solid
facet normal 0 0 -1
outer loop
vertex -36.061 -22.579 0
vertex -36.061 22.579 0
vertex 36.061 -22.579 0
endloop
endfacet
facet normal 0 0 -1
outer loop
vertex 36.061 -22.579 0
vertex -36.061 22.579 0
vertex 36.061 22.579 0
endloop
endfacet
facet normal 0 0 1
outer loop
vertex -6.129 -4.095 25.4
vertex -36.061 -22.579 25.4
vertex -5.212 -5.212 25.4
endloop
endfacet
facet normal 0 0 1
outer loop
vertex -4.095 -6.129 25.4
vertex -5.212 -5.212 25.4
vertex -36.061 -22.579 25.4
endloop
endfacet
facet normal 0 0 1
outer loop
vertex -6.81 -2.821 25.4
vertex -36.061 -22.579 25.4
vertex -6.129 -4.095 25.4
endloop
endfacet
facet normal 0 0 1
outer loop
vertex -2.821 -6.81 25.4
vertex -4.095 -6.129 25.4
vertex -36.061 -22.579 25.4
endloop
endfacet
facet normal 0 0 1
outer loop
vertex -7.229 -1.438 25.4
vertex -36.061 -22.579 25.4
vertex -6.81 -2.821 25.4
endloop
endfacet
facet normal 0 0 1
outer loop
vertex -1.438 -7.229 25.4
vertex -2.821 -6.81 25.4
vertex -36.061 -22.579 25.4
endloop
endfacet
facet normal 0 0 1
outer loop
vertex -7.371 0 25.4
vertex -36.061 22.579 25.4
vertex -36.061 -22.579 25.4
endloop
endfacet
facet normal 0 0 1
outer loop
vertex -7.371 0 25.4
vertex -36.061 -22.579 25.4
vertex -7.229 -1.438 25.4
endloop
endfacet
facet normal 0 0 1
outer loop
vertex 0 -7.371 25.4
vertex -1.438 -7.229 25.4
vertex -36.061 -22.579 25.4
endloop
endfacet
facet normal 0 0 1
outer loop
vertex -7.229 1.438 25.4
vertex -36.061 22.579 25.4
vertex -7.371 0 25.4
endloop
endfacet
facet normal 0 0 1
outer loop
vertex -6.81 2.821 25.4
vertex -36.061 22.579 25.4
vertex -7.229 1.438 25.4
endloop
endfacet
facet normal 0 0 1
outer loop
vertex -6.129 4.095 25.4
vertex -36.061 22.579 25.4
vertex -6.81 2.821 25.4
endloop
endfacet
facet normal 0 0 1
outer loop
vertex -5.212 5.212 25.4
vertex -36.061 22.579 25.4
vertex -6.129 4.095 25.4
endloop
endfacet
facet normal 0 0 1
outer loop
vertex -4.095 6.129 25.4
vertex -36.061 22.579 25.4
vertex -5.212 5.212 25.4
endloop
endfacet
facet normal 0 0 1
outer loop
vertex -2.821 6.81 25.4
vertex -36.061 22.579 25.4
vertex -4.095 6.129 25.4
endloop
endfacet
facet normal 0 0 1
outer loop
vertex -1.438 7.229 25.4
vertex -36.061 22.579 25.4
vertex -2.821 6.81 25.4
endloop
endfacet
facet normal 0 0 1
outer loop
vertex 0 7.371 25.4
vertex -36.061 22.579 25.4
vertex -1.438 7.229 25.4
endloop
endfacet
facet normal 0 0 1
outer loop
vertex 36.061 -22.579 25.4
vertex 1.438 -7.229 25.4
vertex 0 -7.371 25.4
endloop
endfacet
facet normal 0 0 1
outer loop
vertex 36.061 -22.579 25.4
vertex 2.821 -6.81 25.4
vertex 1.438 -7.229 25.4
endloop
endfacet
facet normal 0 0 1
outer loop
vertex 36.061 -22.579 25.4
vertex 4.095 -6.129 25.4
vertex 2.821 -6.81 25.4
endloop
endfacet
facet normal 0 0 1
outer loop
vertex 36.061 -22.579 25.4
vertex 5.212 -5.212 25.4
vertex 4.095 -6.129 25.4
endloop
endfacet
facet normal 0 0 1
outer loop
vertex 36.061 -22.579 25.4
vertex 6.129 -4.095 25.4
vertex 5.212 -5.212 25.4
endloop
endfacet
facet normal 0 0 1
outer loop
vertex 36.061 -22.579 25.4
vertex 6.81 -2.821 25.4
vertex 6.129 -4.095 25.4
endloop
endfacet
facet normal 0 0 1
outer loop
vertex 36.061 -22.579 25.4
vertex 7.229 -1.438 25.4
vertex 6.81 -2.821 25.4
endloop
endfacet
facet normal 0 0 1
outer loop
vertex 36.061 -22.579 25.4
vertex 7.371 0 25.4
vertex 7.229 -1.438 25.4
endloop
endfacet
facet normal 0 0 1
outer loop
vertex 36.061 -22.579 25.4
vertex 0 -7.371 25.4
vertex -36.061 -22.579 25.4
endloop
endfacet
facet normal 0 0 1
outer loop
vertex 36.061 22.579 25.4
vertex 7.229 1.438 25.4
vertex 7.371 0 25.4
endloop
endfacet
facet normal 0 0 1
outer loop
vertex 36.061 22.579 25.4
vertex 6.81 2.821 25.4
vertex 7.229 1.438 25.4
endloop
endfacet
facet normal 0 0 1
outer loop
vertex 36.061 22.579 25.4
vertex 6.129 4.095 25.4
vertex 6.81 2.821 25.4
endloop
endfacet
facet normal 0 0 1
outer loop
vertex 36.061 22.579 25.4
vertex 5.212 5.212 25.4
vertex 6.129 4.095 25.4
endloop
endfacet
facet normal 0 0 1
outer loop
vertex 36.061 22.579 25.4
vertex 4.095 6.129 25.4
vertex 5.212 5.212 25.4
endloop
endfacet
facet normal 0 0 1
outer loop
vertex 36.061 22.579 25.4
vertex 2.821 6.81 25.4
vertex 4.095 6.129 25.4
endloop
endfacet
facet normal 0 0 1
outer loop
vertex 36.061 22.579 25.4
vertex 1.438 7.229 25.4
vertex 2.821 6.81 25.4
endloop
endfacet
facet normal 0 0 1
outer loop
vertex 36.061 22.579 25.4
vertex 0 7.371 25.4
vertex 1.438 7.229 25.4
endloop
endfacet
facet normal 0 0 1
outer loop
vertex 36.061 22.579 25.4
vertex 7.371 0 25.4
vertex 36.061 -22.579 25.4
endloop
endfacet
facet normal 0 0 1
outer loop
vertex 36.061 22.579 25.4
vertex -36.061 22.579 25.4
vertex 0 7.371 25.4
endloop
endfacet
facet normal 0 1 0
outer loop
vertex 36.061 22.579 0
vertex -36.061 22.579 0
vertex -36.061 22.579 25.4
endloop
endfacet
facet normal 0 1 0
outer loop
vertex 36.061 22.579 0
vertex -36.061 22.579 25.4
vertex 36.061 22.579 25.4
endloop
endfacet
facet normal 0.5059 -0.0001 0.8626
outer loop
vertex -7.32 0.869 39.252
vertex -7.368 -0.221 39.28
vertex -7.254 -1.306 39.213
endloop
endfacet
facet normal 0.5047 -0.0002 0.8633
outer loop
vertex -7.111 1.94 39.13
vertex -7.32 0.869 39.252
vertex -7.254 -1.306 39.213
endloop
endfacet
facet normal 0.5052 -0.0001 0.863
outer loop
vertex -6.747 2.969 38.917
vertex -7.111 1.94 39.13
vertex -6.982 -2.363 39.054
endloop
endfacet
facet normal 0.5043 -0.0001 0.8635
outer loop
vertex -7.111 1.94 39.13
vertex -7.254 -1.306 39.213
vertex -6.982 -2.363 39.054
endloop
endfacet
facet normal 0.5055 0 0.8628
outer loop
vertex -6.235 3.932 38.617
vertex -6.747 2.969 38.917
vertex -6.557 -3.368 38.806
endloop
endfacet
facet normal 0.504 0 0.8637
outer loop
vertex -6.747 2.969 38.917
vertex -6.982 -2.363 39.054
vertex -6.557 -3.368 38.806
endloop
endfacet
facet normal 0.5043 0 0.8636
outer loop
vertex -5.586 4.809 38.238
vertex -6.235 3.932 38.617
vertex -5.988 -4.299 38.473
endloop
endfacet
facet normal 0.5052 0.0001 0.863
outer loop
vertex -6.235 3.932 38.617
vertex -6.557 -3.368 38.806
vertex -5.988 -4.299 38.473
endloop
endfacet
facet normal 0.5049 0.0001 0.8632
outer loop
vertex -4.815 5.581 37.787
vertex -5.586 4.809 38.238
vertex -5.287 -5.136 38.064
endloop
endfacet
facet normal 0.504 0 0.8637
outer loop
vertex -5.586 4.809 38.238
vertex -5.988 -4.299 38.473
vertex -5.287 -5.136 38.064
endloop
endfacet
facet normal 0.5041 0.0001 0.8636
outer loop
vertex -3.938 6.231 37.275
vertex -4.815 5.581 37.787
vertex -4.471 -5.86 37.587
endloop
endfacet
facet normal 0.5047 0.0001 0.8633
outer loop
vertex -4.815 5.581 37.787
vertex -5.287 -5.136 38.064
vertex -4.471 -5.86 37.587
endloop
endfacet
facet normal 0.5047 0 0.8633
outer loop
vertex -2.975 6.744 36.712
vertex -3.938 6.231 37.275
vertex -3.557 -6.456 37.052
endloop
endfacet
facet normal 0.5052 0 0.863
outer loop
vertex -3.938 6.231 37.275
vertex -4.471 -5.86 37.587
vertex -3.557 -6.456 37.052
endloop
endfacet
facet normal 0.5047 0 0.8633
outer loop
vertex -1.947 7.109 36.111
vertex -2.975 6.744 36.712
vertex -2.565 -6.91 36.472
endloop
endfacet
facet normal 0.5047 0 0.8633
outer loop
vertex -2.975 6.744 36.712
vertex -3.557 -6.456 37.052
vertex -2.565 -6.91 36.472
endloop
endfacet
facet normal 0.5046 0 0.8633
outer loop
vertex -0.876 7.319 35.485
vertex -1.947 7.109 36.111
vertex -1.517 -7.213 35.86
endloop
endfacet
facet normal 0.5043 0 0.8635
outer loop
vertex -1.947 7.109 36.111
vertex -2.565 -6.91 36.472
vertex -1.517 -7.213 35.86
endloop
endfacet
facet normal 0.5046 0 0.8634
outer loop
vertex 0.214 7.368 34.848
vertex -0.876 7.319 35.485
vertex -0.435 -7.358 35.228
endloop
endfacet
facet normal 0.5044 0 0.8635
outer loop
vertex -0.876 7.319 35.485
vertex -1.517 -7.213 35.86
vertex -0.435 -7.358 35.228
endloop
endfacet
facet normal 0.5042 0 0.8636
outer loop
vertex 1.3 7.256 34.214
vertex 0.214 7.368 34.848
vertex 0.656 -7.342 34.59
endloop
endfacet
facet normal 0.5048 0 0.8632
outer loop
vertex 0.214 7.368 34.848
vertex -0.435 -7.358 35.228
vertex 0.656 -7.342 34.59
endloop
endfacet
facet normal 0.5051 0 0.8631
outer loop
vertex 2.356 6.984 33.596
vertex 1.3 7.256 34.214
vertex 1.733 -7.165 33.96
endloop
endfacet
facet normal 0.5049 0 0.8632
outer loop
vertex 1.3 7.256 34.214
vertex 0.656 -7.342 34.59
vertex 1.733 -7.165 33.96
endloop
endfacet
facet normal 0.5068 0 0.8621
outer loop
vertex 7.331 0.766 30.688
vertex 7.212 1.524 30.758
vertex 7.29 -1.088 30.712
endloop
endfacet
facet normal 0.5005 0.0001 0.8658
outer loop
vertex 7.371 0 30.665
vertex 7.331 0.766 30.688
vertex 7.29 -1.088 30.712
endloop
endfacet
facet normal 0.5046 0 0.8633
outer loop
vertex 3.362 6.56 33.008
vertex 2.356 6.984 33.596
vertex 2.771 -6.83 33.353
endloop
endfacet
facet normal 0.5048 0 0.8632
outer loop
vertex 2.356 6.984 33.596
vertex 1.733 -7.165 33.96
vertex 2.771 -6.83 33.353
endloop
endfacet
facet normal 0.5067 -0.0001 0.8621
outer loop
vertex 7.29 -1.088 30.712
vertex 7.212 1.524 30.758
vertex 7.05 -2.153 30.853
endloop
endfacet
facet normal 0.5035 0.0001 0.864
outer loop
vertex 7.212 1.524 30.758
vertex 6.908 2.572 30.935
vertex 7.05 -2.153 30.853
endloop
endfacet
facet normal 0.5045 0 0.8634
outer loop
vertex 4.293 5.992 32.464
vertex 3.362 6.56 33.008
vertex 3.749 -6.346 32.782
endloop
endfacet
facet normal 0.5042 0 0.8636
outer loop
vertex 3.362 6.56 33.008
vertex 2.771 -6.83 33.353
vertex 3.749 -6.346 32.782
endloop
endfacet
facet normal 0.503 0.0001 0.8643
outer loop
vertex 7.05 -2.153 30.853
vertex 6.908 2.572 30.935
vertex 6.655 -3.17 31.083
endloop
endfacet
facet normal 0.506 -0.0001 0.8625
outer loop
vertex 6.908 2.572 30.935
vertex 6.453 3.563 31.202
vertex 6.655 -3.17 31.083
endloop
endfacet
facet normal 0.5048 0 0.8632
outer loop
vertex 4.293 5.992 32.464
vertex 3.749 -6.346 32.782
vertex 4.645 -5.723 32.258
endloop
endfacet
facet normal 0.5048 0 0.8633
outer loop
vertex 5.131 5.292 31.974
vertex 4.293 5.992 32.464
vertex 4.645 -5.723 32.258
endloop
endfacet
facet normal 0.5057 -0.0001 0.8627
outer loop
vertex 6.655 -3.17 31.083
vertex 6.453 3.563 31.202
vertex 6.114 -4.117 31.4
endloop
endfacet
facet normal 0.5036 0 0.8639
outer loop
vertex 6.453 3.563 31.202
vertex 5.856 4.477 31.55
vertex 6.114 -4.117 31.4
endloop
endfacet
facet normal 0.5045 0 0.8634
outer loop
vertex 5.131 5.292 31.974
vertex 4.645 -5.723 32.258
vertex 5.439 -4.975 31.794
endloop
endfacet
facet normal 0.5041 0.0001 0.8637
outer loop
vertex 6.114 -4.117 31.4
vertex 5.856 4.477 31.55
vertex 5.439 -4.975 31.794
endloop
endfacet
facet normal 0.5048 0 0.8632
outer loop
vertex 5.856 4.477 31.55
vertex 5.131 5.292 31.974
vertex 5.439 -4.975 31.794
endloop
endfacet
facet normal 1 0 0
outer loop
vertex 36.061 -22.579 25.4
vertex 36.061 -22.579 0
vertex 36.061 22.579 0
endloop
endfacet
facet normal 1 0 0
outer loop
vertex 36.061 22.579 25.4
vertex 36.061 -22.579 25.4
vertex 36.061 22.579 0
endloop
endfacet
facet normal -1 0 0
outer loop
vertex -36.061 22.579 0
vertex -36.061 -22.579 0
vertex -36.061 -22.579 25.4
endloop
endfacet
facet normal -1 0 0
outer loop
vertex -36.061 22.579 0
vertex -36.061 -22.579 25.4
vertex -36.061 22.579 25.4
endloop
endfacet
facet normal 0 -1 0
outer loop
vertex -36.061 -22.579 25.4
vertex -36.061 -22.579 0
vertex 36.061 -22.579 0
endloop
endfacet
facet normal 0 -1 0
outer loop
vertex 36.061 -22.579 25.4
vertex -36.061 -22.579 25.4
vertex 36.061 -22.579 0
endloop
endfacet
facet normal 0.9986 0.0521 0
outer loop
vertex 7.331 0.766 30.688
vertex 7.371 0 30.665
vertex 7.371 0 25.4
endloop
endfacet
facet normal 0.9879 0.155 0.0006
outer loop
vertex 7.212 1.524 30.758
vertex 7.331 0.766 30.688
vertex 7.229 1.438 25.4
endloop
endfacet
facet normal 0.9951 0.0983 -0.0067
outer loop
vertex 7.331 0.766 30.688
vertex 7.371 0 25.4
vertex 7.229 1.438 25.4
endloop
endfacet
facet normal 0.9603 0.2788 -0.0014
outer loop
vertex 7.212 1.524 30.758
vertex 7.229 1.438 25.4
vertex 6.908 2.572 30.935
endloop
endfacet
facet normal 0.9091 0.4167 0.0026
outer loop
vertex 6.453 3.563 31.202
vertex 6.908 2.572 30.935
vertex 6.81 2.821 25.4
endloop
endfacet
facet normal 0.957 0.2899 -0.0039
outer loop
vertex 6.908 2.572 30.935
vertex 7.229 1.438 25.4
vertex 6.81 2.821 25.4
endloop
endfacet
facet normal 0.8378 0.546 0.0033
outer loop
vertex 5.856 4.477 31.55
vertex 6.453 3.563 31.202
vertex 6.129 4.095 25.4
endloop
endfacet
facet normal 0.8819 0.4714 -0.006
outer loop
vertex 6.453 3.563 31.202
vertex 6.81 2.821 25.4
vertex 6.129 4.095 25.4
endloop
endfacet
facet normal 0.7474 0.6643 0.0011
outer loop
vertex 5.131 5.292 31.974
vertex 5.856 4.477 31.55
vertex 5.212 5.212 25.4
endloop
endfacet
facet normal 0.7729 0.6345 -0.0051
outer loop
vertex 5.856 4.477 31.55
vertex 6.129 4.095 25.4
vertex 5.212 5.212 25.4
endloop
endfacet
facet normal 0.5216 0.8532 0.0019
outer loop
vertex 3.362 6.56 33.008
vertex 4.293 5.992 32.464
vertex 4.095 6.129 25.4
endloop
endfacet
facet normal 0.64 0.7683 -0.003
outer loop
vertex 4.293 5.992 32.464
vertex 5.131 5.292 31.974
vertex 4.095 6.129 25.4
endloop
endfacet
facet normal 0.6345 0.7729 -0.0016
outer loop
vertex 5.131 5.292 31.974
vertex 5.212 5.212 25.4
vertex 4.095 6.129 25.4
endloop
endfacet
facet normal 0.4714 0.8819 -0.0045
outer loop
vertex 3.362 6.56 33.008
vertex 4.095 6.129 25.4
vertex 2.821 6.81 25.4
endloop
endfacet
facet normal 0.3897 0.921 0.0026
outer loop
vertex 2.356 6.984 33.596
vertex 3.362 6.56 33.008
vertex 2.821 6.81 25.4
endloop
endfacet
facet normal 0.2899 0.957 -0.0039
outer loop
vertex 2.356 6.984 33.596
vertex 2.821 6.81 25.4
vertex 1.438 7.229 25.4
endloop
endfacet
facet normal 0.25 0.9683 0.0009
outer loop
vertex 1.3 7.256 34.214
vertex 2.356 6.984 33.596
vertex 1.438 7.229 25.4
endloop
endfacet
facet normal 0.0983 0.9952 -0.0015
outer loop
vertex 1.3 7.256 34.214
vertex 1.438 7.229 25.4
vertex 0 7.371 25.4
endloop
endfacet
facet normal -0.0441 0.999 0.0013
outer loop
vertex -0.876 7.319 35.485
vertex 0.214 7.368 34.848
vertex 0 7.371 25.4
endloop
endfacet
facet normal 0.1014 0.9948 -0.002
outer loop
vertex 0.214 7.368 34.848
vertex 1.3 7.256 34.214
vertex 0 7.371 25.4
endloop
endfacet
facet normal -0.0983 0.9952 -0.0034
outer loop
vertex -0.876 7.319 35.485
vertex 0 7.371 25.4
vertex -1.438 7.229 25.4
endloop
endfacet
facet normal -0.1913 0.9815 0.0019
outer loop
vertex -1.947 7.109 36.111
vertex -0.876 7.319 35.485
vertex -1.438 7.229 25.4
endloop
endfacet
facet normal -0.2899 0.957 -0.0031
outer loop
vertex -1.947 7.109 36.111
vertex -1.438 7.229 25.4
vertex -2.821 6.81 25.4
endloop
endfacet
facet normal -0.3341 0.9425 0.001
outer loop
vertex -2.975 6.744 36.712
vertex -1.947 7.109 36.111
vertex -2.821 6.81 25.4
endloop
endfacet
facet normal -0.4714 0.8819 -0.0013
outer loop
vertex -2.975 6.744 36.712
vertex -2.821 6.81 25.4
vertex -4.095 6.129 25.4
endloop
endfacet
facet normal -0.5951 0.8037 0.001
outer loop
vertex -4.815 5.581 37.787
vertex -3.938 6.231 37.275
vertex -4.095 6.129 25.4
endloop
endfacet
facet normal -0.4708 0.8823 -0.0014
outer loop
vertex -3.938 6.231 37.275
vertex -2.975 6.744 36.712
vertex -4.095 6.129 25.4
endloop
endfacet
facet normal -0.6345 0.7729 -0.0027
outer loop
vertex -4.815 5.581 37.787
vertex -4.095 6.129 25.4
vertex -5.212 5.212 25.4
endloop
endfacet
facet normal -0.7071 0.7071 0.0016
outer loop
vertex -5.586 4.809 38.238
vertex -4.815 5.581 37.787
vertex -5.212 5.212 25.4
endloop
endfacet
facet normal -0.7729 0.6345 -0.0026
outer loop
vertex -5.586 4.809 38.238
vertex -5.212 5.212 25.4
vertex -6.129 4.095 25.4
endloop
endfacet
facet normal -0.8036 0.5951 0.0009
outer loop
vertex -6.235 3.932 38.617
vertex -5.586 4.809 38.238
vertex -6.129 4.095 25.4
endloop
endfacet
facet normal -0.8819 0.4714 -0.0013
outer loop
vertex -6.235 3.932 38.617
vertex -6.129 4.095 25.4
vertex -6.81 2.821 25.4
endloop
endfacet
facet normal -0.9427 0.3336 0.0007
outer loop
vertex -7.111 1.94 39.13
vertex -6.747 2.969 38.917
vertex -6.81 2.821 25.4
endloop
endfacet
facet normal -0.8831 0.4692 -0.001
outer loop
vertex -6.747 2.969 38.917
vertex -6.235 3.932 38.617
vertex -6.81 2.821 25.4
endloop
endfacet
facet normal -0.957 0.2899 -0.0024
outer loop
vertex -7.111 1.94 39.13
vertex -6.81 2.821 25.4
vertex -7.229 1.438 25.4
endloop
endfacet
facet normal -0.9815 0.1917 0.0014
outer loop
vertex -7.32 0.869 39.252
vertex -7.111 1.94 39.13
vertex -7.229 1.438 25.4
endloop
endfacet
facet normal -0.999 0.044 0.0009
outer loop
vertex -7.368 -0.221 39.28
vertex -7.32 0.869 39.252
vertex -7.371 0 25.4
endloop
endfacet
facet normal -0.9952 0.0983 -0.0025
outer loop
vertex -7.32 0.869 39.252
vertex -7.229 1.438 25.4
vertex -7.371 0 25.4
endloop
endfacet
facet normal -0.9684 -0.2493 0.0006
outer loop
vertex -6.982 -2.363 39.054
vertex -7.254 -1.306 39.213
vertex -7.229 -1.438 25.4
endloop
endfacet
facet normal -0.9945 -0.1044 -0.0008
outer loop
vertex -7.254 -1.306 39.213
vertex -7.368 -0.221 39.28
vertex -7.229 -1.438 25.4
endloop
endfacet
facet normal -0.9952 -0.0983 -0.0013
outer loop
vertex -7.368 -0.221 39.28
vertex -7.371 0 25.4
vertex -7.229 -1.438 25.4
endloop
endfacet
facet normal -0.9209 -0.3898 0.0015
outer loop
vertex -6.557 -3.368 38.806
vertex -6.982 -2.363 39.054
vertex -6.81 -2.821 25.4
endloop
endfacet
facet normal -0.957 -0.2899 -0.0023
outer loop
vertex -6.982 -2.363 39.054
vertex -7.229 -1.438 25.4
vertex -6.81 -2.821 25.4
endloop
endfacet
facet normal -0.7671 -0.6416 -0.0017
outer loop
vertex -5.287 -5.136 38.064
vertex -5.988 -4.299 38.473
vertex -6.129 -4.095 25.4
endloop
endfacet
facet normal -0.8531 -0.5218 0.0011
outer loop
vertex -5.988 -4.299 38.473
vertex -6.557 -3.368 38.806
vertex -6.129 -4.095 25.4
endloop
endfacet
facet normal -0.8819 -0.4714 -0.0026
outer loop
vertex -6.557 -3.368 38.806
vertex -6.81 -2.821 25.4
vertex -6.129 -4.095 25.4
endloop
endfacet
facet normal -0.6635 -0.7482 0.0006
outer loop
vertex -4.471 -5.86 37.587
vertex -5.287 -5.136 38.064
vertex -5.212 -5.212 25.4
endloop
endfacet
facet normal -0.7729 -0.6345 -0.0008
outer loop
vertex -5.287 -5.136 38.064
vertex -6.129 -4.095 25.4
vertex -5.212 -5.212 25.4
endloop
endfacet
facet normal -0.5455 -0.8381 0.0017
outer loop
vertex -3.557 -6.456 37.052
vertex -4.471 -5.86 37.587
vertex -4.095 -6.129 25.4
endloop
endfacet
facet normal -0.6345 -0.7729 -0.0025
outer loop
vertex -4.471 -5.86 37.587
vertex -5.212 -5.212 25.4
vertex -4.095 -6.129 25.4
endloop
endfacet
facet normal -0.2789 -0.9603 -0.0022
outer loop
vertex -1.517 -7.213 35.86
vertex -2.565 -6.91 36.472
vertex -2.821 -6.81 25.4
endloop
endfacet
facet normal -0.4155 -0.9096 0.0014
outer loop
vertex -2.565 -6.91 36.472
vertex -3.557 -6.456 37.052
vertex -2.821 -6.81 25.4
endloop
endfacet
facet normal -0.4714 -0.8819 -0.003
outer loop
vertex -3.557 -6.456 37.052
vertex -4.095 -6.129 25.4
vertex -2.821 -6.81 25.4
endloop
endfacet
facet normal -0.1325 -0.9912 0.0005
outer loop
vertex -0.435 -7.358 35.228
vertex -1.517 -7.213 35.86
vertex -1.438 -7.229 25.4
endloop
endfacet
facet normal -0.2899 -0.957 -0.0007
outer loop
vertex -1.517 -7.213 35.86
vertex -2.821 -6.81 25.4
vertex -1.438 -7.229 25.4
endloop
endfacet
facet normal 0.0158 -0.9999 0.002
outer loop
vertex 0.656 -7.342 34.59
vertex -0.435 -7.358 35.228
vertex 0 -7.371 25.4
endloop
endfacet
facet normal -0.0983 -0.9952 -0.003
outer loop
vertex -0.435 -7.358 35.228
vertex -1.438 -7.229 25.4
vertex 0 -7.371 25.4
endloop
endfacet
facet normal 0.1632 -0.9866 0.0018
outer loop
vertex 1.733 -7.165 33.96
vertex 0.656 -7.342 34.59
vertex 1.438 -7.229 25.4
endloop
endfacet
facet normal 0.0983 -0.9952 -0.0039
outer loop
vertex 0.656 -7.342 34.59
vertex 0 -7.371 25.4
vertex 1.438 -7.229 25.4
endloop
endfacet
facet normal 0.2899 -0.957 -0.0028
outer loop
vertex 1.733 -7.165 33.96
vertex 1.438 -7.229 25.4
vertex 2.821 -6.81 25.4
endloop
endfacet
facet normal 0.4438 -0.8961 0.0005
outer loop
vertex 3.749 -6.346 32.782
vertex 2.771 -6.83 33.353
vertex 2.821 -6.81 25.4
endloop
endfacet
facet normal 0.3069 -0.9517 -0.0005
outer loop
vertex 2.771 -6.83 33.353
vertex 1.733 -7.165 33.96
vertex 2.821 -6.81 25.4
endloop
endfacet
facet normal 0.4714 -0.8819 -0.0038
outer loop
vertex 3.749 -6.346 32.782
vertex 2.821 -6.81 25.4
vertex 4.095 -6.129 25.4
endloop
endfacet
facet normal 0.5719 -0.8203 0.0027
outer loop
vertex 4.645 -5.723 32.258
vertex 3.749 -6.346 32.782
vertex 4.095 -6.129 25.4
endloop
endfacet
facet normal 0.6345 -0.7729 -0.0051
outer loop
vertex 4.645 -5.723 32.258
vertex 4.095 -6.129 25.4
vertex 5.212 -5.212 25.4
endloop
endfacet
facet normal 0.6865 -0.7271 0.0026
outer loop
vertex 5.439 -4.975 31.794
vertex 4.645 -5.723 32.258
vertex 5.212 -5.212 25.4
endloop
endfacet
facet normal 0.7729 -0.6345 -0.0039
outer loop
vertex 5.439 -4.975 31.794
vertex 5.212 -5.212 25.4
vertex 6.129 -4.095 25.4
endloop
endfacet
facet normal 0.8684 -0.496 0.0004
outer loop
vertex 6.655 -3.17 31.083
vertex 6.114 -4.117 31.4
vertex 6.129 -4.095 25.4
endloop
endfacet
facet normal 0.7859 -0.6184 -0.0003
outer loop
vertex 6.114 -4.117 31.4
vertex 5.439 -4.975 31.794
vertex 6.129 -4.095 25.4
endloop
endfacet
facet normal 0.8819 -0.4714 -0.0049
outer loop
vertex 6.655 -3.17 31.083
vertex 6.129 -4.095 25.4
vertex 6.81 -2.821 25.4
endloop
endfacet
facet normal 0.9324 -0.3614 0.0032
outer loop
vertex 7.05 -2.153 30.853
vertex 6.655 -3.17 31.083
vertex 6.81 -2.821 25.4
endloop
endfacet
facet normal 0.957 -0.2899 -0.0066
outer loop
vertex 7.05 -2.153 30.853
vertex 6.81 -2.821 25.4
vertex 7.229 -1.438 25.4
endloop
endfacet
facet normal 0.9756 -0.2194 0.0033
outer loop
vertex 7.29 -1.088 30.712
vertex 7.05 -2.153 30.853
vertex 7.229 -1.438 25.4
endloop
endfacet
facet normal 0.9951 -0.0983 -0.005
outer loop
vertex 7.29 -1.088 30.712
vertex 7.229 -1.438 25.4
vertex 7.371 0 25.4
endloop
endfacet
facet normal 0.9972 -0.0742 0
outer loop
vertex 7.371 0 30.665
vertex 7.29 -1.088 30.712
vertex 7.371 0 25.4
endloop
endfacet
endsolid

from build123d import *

# Parameters (mm, degrees)
F0_W     = 72.121516
F0_H     = 45.15715
F1_DEPTH = 25.4
F2_R     = 7.371014
F3_DEPTH = 14.986
F5_DEPTH = 41.656


with BuildPart() as f1:
    # F0 (on Top) → F1 (new body)
    with BuildSketch(Plane.XY):
        Rectangle(F0_W, F0_H)
    extrude(amount=F1_DEPTH)

    # F2 (on face) → F3 (join)
    with BuildSketch(Plane.XY.offset(25.4)):
        Circle(F2_R)
    extrude(amount=F3_DEPTH)

    # F4 (on face) → F5 (cut)
    with BuildSketch(Plane.XZ.offset(22.578575)):
        Polygon((10.064982, 44.364773), (-10.993307, 41.398816), (10.064982, 29.090097), align=None)
    extrude(amount=-F5_DEPTH, mode=Mode.SUBTRACT)


solid = f1.part
